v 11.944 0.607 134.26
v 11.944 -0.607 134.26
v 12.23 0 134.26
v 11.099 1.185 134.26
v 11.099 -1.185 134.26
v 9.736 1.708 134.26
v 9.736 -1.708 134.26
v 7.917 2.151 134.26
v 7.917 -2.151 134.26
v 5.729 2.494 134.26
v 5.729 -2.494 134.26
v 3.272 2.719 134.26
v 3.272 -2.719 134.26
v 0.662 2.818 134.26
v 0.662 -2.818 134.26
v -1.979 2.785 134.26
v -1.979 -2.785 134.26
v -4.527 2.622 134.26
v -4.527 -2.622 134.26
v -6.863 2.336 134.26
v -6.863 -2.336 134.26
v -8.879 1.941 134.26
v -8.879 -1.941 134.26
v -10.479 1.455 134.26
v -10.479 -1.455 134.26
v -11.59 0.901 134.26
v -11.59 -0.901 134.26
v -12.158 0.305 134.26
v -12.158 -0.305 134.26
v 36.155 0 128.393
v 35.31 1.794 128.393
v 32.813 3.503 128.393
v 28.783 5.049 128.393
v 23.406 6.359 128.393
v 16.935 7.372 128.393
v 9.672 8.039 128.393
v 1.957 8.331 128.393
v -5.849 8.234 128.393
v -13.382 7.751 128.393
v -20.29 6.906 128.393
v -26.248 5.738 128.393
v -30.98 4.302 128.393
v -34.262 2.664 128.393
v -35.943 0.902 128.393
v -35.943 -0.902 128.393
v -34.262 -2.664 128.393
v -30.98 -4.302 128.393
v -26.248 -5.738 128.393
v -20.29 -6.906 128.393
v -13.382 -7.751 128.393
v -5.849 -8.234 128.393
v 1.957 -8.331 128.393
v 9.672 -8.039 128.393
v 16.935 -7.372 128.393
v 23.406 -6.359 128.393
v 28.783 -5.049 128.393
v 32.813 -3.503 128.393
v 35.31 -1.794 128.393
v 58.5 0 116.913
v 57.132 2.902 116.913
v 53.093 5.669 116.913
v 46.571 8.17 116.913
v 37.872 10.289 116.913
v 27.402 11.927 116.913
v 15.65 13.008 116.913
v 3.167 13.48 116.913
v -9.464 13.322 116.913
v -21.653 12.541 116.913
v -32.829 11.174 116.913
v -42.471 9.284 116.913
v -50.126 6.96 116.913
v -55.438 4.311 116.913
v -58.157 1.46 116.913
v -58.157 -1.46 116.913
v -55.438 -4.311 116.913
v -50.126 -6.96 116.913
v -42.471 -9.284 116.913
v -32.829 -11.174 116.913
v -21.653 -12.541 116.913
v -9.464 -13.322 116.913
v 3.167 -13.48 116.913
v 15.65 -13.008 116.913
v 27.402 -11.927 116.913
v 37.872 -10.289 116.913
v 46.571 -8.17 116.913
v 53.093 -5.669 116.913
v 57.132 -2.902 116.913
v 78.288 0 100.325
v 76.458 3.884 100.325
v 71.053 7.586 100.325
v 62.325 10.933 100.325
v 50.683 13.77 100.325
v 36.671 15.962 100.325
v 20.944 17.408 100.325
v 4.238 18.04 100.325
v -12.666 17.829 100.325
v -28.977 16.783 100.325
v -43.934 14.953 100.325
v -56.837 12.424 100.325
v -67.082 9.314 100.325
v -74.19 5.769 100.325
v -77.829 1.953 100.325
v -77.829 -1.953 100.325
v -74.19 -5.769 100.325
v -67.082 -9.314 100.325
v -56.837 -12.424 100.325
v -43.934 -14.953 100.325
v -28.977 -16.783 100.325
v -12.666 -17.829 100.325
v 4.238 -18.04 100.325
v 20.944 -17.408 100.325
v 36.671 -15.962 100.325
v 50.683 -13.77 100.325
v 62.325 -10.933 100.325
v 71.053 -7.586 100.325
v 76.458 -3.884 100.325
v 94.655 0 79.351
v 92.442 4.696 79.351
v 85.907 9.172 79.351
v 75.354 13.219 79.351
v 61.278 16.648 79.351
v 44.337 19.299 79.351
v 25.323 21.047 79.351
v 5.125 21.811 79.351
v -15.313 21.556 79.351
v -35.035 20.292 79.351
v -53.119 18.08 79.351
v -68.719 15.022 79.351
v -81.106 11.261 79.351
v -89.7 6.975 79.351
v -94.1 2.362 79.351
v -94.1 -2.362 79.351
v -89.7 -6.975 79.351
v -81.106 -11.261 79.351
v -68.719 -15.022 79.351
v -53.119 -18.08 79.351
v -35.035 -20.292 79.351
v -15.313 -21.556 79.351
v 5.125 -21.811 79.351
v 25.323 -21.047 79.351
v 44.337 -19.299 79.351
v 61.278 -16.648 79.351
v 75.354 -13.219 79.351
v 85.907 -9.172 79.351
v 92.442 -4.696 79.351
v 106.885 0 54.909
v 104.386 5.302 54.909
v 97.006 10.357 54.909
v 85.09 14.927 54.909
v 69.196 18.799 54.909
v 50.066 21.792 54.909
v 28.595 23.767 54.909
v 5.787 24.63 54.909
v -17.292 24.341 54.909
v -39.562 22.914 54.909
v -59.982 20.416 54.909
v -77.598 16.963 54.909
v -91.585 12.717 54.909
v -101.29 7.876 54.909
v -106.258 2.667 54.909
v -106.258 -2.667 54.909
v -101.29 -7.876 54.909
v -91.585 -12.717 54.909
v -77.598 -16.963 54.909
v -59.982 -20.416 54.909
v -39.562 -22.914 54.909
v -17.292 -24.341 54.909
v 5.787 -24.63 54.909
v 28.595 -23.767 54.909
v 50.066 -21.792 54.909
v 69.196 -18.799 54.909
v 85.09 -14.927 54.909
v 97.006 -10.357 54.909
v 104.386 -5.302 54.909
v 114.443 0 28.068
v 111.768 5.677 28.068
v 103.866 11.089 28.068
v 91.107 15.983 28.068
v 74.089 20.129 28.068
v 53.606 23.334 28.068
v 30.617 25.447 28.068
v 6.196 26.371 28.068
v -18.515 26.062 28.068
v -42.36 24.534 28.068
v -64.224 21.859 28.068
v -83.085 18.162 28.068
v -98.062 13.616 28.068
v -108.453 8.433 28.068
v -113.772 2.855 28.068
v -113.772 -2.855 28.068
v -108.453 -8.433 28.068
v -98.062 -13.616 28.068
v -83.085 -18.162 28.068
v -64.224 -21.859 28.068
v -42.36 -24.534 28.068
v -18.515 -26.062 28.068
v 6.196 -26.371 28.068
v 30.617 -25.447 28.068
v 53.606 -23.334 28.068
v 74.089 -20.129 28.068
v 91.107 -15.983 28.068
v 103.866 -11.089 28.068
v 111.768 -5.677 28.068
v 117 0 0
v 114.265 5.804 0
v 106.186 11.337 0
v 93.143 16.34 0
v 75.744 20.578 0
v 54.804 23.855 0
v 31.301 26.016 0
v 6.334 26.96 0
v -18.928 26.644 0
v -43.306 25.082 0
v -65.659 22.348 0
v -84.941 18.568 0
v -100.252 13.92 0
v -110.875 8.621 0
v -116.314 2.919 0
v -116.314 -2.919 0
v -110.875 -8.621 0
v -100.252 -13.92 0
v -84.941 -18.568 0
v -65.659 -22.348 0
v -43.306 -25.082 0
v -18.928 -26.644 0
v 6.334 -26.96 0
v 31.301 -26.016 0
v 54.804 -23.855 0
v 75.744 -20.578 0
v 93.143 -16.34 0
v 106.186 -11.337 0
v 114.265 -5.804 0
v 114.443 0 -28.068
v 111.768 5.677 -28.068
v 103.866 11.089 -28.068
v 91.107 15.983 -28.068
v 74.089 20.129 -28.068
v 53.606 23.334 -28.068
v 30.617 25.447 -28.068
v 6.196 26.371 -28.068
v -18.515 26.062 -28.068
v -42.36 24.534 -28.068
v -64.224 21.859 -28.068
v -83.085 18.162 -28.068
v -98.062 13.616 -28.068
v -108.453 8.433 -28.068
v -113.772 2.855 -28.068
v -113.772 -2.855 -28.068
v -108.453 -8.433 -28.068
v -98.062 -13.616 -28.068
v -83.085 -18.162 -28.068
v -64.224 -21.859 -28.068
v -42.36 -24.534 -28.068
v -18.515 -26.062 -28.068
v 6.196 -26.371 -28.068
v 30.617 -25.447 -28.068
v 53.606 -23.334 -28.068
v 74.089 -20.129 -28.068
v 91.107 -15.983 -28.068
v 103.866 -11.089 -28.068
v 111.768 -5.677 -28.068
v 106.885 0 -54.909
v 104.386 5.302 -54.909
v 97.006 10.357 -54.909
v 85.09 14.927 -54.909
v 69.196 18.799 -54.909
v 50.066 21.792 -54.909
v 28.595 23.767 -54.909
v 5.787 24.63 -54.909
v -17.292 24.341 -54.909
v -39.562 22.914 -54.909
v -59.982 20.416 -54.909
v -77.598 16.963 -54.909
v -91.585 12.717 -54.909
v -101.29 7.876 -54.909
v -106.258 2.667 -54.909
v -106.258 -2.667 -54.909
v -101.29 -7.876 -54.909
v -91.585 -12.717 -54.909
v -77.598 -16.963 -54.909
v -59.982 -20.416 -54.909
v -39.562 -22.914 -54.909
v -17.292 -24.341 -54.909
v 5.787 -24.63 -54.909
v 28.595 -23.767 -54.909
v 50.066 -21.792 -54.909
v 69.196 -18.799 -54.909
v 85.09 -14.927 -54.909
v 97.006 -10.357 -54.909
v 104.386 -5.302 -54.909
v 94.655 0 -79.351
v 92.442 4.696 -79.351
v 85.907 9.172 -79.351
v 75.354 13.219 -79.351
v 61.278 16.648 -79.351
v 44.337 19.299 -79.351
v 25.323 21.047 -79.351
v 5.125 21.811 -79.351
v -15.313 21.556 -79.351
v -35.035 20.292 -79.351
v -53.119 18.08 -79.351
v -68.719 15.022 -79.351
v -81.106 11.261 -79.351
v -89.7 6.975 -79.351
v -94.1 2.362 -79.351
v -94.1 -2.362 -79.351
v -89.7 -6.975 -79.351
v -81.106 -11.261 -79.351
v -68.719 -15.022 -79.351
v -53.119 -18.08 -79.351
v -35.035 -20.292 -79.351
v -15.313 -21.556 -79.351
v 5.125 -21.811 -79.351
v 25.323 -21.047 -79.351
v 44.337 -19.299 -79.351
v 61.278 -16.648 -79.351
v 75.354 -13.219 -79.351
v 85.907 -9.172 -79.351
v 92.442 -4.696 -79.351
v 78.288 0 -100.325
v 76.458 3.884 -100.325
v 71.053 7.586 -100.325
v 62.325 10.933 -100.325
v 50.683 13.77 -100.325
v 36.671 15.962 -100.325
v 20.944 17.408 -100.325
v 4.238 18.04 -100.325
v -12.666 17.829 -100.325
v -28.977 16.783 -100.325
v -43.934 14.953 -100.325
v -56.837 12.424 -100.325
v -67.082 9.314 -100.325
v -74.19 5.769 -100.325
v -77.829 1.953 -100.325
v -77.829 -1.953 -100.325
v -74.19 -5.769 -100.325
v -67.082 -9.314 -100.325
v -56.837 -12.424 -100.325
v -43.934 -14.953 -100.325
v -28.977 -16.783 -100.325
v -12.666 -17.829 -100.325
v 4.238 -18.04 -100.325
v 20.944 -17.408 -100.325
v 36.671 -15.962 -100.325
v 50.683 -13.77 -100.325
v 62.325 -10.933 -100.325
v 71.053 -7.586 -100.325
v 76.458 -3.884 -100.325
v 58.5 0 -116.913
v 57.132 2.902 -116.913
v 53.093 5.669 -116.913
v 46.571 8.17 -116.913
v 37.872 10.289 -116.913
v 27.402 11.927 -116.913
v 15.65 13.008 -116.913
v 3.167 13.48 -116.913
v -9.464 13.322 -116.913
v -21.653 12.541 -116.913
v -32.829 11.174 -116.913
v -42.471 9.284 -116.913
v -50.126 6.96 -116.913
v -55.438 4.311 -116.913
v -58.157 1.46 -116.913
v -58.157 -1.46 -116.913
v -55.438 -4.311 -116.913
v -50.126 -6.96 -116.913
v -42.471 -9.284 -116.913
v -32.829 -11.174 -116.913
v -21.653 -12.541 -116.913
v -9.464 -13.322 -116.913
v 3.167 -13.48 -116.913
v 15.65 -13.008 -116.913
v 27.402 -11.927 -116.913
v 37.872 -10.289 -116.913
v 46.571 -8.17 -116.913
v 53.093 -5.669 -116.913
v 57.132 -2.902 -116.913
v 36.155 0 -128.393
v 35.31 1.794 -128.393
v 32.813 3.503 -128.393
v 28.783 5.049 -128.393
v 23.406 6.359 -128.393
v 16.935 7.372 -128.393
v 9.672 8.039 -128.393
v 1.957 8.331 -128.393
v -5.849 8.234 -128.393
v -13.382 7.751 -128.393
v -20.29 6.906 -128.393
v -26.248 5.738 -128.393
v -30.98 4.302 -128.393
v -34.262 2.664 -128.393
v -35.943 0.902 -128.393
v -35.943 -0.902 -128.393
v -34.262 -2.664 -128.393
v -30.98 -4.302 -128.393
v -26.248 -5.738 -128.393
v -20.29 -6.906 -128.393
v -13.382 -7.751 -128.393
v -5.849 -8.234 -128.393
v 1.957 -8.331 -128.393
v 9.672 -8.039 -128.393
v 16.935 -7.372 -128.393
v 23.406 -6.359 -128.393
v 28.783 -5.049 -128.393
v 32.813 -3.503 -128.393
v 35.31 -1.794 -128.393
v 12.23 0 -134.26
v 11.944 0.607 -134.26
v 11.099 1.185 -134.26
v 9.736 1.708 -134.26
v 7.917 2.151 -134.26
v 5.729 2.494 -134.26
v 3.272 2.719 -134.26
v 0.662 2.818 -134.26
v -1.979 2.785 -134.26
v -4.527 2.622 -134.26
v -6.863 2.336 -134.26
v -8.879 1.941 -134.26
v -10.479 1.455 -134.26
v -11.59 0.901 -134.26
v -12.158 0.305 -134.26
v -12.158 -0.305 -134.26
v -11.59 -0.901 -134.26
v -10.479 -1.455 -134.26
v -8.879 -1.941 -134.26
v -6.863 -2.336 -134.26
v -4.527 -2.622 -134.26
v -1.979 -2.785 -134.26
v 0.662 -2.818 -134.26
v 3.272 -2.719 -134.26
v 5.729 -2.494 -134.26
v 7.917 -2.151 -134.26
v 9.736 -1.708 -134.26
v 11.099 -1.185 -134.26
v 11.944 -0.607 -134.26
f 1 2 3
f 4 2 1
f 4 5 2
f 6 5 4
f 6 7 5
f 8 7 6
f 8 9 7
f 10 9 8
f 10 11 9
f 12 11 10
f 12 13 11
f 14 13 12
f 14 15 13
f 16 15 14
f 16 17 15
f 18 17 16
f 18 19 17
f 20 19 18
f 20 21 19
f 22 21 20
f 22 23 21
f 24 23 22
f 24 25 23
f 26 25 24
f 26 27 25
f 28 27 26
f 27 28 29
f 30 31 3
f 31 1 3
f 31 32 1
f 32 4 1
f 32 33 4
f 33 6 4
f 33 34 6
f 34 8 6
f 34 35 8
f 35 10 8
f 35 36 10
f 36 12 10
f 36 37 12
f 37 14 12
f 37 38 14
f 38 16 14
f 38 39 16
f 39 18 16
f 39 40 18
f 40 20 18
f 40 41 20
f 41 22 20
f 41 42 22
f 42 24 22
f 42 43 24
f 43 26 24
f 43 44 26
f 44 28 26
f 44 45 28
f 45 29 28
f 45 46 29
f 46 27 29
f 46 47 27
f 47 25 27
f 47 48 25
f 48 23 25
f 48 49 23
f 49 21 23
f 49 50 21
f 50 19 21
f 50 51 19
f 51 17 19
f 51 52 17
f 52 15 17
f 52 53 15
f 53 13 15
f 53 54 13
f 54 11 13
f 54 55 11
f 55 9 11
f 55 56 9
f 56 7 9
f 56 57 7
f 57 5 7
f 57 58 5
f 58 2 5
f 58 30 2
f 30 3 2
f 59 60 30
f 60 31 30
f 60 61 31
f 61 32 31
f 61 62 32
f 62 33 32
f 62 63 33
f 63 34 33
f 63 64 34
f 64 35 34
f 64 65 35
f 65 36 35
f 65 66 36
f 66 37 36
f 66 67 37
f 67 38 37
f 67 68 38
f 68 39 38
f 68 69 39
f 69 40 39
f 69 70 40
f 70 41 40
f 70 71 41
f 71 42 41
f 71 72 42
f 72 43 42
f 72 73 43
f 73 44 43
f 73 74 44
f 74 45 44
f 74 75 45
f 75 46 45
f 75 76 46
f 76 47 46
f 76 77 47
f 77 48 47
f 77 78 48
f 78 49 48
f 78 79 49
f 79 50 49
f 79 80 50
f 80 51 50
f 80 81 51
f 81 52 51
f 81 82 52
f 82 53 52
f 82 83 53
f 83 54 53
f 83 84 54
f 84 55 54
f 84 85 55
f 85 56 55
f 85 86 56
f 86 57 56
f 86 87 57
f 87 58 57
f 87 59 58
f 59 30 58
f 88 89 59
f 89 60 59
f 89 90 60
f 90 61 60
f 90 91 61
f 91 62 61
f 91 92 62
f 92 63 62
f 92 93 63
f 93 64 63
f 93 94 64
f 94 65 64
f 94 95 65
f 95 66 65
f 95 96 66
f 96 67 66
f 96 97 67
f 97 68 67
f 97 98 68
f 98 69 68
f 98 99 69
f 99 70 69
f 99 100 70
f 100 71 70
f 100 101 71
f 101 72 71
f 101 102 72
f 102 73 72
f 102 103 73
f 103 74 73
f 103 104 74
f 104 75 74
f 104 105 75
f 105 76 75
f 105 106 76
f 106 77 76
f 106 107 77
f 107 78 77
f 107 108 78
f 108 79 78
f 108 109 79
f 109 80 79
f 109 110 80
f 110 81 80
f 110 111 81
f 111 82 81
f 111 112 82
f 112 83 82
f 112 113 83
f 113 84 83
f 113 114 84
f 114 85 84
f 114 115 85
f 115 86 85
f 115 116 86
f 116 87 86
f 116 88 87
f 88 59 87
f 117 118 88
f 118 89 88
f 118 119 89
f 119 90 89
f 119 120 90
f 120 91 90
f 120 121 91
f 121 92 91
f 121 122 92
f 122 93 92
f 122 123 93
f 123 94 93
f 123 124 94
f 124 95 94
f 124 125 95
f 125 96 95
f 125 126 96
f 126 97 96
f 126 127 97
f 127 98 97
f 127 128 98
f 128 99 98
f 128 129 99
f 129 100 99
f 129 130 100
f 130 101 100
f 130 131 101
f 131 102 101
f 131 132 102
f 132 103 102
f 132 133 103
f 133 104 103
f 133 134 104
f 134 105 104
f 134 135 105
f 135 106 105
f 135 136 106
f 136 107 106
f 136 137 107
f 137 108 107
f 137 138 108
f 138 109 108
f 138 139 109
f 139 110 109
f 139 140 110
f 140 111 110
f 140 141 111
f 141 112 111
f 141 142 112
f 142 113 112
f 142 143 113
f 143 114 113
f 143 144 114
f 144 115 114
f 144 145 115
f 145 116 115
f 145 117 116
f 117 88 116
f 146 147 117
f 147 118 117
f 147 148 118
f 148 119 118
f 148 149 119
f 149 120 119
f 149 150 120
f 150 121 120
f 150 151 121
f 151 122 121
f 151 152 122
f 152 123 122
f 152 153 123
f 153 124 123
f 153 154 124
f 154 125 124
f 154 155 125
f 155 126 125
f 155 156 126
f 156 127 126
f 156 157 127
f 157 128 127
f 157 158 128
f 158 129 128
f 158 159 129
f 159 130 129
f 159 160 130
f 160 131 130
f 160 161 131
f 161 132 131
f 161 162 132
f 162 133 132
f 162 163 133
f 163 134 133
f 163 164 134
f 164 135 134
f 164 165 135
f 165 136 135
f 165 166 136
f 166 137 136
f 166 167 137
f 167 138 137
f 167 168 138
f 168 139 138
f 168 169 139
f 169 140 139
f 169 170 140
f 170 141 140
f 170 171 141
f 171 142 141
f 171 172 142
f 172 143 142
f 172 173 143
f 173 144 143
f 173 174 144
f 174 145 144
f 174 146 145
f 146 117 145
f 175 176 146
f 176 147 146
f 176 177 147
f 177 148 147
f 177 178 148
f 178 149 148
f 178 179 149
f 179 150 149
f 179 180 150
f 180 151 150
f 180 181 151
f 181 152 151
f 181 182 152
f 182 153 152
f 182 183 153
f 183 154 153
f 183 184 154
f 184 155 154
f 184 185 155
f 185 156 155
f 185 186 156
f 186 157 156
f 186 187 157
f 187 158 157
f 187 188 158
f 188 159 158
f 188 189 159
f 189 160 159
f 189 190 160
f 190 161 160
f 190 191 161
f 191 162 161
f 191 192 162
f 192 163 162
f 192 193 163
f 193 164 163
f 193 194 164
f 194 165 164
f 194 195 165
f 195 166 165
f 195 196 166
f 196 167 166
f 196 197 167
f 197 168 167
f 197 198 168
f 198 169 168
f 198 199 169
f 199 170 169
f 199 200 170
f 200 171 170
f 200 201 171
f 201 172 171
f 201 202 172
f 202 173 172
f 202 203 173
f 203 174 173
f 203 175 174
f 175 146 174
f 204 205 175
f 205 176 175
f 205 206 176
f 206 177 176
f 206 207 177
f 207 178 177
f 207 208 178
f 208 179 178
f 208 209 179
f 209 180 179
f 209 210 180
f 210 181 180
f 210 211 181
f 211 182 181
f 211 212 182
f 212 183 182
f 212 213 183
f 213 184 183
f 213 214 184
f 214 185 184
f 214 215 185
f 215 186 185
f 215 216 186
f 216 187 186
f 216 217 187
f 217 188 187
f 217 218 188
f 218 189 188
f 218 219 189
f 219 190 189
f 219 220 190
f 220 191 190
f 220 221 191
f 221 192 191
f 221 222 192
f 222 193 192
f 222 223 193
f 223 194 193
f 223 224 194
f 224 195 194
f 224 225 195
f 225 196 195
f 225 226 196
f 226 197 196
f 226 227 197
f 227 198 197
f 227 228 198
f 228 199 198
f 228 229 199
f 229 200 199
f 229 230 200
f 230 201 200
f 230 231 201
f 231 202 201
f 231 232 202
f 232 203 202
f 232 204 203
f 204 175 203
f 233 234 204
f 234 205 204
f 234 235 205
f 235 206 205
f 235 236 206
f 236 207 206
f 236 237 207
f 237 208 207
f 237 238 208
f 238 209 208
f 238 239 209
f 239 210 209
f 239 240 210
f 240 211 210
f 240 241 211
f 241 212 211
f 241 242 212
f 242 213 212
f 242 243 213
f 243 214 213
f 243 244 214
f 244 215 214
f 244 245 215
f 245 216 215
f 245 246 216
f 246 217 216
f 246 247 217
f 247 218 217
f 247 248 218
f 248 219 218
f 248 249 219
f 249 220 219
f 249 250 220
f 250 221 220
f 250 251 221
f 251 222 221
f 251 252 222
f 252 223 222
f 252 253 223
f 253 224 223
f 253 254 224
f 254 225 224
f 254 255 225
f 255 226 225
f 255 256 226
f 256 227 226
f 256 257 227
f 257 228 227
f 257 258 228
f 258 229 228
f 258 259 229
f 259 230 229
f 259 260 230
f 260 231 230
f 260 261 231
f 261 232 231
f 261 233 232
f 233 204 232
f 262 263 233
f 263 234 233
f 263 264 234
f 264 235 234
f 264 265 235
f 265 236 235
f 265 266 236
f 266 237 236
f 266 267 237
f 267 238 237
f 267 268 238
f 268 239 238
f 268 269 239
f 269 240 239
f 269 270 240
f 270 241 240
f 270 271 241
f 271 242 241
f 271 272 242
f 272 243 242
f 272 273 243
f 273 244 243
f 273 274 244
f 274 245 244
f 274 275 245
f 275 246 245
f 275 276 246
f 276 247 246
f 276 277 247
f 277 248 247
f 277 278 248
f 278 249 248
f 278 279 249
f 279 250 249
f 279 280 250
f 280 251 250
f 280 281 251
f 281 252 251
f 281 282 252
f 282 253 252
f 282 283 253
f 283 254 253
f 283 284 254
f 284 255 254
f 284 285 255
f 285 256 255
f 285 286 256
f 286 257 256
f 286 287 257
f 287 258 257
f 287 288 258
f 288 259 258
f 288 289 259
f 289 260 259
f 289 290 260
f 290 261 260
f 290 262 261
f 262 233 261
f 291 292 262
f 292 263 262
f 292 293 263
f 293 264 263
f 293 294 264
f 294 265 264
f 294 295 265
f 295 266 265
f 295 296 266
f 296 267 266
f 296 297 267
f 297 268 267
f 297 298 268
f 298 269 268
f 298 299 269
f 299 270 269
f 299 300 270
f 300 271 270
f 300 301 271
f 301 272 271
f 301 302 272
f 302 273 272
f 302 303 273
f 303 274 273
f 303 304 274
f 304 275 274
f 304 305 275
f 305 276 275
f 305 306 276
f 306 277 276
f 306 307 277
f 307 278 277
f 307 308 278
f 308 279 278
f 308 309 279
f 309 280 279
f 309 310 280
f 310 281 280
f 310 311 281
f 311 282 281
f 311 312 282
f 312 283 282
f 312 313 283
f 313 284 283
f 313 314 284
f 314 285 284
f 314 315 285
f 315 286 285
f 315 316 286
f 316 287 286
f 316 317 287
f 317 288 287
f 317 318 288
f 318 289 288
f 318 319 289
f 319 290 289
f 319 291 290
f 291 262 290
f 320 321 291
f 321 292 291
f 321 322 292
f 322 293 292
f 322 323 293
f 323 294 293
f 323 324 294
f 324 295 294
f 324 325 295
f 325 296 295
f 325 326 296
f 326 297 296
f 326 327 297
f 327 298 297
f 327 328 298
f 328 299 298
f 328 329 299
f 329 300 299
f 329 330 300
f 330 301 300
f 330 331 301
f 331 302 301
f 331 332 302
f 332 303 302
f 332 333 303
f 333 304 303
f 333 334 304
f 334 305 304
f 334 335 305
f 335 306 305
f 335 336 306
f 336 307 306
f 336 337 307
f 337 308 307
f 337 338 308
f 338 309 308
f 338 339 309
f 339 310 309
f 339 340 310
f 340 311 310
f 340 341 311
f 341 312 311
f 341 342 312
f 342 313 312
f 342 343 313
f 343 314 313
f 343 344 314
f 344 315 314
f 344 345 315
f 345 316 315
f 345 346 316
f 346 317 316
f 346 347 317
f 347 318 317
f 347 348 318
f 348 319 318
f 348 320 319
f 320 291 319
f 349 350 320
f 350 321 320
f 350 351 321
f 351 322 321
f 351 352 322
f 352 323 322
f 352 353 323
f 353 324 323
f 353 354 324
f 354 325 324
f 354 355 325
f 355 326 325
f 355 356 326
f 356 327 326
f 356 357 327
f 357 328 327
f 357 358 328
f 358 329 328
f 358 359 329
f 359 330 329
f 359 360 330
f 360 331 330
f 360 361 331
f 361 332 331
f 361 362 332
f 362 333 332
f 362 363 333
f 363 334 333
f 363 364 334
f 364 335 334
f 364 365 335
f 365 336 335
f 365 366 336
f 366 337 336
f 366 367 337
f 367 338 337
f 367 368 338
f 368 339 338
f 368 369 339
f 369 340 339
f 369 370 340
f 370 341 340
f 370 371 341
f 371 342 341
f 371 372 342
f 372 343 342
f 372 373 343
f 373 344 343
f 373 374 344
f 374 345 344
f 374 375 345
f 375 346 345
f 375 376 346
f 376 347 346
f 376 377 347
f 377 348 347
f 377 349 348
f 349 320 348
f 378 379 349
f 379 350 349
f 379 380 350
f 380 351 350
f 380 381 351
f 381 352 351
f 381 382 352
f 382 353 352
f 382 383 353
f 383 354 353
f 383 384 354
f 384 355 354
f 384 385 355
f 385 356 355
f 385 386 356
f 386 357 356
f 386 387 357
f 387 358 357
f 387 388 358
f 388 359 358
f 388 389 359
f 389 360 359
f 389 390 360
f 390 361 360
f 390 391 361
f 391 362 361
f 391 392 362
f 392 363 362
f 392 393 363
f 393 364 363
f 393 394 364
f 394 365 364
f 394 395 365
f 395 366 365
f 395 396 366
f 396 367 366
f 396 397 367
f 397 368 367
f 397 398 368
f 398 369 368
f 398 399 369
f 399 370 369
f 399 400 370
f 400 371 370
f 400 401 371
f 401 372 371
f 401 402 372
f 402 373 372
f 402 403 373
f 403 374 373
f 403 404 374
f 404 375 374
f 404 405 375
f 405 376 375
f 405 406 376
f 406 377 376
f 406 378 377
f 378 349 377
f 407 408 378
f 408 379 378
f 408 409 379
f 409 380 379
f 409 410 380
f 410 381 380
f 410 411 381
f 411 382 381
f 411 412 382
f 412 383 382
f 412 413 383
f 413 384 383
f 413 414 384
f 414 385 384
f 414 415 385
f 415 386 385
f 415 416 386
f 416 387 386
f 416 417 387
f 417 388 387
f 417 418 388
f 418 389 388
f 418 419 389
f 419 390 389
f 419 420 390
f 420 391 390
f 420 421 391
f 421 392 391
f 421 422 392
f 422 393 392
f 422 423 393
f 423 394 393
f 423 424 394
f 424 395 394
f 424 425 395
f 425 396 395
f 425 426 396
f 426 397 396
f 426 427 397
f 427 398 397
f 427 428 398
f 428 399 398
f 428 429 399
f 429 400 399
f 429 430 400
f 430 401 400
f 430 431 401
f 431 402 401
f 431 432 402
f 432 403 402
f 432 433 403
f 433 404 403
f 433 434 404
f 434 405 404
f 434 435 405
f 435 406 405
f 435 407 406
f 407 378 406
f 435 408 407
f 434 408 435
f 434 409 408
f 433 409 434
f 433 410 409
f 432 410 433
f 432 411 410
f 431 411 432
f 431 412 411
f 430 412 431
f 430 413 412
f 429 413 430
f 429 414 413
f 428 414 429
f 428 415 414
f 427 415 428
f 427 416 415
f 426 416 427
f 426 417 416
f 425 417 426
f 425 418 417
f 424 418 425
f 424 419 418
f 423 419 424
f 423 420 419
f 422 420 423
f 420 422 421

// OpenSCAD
// Generated by SolidPython 1.0.1 on 2020-07-29 00:46:50


scale(v = [13, 3, 15]) {
	sphere(r = 9);
}
/***********************************************
*********      SolidPython code:      **********
************************************************
 
# import packages: SolidPython
from solid import *
from solid.utils import *
from itertools import chain, combinations, permutations


class Resize:

    def __init__(self, scad_file):
        self.scad_file = scad_file
        #self.scad_file = import_scad(scad_file)
        # cone/cylinder param:
        self.r1 = 0
        self.r2 = 0
        self.h = 0
        # rectangular prism param:
        self.w = 0
        self.l = 0
        # ellipse param:
        self.r = 0

    # import OpenScad code (file name corresponds to shape)


    # classify shape + parameters
    def assign(self, param1, param2, param3):
        if self.scad_file == 'cone.scad':
            self.r1 = param1
            self.r2 = param2
            self.h = param3
        elif self.scad_file == 'cylinder.scad':
            self.r1 = param1
            self.r2 = param2
            self.h = param3
        elif self.scad_file == 'rectangularPrism.scad':
            self.h = param1
            self.l = param2
            self.w = param3
        else:
            self.r = param1
            self.h = param2

    # resize parameters
    def iterate(self):
        x = range(3, 20, 2)
        i = 1
        if self.scad_file == 'cone.scad':
            tempList = list(permutations(x, 2))
            for temp in tempList:
                param1 = temp[0]
                param2 = temp[1]
                filepath = 'produced_scad_files/' + 'cone' + str(param1) + '_' + str(param2) + '_' + '.scad'
                scad_render_to_file(cylinder(h=param1, r1=param2, r2=0), filepath)

        elif self.scad_file == 'cylinder.scad':
            tempList = list(permutations(x, 3))
            for temp in tempList:
                param1 = temp[0]
                param2 = temp[1]
                filepath = 'produced_scad_files/' + 'cylinder' + str(param1) + '_' + str(param2) + '_' + '.scad'
                scad_render_to_file(cylinder(h=param1, r1=param2, r2=param2), filepath)

        elif self.scad_file == 'rectangularPrism.scad':
            tempList = list(permutations(x, 3))
            for temp in tempList:
                param1 = temp[0]
                param2 = temp[1]
                param3 = temp[2]
                filepath = 'produced_scad_files/' + 'rectangularPrism' + str(param1) + '_' + str(param2) + '_' + str(
                    param3) + '.scad'
                scad_render_to_file(cube(size=(param1, param2, param3)), filepath)

        elif self.scad_file == 'ellipse.scad':
            tempList = list(permutations(x, 4))
            for temp in tempList:
                param1 = temp[0]
                param2 = temp[1]
                param3 = temp[2]
                param4 = temp[3]
                filepath = 'produced_scad_files/' + 'ellipse' + str(param1) + '_' + str(param2) + '_' + str(param3) + '_' + str(param4) + '.scad'
                scad_render_to_file(scale([param1, param2, param3])(sphere(r=param4)), filepath)

    def render_to_scadfile(self):
        scad_render_to_file(scad, 'example.scad') 
 
************************************************/
